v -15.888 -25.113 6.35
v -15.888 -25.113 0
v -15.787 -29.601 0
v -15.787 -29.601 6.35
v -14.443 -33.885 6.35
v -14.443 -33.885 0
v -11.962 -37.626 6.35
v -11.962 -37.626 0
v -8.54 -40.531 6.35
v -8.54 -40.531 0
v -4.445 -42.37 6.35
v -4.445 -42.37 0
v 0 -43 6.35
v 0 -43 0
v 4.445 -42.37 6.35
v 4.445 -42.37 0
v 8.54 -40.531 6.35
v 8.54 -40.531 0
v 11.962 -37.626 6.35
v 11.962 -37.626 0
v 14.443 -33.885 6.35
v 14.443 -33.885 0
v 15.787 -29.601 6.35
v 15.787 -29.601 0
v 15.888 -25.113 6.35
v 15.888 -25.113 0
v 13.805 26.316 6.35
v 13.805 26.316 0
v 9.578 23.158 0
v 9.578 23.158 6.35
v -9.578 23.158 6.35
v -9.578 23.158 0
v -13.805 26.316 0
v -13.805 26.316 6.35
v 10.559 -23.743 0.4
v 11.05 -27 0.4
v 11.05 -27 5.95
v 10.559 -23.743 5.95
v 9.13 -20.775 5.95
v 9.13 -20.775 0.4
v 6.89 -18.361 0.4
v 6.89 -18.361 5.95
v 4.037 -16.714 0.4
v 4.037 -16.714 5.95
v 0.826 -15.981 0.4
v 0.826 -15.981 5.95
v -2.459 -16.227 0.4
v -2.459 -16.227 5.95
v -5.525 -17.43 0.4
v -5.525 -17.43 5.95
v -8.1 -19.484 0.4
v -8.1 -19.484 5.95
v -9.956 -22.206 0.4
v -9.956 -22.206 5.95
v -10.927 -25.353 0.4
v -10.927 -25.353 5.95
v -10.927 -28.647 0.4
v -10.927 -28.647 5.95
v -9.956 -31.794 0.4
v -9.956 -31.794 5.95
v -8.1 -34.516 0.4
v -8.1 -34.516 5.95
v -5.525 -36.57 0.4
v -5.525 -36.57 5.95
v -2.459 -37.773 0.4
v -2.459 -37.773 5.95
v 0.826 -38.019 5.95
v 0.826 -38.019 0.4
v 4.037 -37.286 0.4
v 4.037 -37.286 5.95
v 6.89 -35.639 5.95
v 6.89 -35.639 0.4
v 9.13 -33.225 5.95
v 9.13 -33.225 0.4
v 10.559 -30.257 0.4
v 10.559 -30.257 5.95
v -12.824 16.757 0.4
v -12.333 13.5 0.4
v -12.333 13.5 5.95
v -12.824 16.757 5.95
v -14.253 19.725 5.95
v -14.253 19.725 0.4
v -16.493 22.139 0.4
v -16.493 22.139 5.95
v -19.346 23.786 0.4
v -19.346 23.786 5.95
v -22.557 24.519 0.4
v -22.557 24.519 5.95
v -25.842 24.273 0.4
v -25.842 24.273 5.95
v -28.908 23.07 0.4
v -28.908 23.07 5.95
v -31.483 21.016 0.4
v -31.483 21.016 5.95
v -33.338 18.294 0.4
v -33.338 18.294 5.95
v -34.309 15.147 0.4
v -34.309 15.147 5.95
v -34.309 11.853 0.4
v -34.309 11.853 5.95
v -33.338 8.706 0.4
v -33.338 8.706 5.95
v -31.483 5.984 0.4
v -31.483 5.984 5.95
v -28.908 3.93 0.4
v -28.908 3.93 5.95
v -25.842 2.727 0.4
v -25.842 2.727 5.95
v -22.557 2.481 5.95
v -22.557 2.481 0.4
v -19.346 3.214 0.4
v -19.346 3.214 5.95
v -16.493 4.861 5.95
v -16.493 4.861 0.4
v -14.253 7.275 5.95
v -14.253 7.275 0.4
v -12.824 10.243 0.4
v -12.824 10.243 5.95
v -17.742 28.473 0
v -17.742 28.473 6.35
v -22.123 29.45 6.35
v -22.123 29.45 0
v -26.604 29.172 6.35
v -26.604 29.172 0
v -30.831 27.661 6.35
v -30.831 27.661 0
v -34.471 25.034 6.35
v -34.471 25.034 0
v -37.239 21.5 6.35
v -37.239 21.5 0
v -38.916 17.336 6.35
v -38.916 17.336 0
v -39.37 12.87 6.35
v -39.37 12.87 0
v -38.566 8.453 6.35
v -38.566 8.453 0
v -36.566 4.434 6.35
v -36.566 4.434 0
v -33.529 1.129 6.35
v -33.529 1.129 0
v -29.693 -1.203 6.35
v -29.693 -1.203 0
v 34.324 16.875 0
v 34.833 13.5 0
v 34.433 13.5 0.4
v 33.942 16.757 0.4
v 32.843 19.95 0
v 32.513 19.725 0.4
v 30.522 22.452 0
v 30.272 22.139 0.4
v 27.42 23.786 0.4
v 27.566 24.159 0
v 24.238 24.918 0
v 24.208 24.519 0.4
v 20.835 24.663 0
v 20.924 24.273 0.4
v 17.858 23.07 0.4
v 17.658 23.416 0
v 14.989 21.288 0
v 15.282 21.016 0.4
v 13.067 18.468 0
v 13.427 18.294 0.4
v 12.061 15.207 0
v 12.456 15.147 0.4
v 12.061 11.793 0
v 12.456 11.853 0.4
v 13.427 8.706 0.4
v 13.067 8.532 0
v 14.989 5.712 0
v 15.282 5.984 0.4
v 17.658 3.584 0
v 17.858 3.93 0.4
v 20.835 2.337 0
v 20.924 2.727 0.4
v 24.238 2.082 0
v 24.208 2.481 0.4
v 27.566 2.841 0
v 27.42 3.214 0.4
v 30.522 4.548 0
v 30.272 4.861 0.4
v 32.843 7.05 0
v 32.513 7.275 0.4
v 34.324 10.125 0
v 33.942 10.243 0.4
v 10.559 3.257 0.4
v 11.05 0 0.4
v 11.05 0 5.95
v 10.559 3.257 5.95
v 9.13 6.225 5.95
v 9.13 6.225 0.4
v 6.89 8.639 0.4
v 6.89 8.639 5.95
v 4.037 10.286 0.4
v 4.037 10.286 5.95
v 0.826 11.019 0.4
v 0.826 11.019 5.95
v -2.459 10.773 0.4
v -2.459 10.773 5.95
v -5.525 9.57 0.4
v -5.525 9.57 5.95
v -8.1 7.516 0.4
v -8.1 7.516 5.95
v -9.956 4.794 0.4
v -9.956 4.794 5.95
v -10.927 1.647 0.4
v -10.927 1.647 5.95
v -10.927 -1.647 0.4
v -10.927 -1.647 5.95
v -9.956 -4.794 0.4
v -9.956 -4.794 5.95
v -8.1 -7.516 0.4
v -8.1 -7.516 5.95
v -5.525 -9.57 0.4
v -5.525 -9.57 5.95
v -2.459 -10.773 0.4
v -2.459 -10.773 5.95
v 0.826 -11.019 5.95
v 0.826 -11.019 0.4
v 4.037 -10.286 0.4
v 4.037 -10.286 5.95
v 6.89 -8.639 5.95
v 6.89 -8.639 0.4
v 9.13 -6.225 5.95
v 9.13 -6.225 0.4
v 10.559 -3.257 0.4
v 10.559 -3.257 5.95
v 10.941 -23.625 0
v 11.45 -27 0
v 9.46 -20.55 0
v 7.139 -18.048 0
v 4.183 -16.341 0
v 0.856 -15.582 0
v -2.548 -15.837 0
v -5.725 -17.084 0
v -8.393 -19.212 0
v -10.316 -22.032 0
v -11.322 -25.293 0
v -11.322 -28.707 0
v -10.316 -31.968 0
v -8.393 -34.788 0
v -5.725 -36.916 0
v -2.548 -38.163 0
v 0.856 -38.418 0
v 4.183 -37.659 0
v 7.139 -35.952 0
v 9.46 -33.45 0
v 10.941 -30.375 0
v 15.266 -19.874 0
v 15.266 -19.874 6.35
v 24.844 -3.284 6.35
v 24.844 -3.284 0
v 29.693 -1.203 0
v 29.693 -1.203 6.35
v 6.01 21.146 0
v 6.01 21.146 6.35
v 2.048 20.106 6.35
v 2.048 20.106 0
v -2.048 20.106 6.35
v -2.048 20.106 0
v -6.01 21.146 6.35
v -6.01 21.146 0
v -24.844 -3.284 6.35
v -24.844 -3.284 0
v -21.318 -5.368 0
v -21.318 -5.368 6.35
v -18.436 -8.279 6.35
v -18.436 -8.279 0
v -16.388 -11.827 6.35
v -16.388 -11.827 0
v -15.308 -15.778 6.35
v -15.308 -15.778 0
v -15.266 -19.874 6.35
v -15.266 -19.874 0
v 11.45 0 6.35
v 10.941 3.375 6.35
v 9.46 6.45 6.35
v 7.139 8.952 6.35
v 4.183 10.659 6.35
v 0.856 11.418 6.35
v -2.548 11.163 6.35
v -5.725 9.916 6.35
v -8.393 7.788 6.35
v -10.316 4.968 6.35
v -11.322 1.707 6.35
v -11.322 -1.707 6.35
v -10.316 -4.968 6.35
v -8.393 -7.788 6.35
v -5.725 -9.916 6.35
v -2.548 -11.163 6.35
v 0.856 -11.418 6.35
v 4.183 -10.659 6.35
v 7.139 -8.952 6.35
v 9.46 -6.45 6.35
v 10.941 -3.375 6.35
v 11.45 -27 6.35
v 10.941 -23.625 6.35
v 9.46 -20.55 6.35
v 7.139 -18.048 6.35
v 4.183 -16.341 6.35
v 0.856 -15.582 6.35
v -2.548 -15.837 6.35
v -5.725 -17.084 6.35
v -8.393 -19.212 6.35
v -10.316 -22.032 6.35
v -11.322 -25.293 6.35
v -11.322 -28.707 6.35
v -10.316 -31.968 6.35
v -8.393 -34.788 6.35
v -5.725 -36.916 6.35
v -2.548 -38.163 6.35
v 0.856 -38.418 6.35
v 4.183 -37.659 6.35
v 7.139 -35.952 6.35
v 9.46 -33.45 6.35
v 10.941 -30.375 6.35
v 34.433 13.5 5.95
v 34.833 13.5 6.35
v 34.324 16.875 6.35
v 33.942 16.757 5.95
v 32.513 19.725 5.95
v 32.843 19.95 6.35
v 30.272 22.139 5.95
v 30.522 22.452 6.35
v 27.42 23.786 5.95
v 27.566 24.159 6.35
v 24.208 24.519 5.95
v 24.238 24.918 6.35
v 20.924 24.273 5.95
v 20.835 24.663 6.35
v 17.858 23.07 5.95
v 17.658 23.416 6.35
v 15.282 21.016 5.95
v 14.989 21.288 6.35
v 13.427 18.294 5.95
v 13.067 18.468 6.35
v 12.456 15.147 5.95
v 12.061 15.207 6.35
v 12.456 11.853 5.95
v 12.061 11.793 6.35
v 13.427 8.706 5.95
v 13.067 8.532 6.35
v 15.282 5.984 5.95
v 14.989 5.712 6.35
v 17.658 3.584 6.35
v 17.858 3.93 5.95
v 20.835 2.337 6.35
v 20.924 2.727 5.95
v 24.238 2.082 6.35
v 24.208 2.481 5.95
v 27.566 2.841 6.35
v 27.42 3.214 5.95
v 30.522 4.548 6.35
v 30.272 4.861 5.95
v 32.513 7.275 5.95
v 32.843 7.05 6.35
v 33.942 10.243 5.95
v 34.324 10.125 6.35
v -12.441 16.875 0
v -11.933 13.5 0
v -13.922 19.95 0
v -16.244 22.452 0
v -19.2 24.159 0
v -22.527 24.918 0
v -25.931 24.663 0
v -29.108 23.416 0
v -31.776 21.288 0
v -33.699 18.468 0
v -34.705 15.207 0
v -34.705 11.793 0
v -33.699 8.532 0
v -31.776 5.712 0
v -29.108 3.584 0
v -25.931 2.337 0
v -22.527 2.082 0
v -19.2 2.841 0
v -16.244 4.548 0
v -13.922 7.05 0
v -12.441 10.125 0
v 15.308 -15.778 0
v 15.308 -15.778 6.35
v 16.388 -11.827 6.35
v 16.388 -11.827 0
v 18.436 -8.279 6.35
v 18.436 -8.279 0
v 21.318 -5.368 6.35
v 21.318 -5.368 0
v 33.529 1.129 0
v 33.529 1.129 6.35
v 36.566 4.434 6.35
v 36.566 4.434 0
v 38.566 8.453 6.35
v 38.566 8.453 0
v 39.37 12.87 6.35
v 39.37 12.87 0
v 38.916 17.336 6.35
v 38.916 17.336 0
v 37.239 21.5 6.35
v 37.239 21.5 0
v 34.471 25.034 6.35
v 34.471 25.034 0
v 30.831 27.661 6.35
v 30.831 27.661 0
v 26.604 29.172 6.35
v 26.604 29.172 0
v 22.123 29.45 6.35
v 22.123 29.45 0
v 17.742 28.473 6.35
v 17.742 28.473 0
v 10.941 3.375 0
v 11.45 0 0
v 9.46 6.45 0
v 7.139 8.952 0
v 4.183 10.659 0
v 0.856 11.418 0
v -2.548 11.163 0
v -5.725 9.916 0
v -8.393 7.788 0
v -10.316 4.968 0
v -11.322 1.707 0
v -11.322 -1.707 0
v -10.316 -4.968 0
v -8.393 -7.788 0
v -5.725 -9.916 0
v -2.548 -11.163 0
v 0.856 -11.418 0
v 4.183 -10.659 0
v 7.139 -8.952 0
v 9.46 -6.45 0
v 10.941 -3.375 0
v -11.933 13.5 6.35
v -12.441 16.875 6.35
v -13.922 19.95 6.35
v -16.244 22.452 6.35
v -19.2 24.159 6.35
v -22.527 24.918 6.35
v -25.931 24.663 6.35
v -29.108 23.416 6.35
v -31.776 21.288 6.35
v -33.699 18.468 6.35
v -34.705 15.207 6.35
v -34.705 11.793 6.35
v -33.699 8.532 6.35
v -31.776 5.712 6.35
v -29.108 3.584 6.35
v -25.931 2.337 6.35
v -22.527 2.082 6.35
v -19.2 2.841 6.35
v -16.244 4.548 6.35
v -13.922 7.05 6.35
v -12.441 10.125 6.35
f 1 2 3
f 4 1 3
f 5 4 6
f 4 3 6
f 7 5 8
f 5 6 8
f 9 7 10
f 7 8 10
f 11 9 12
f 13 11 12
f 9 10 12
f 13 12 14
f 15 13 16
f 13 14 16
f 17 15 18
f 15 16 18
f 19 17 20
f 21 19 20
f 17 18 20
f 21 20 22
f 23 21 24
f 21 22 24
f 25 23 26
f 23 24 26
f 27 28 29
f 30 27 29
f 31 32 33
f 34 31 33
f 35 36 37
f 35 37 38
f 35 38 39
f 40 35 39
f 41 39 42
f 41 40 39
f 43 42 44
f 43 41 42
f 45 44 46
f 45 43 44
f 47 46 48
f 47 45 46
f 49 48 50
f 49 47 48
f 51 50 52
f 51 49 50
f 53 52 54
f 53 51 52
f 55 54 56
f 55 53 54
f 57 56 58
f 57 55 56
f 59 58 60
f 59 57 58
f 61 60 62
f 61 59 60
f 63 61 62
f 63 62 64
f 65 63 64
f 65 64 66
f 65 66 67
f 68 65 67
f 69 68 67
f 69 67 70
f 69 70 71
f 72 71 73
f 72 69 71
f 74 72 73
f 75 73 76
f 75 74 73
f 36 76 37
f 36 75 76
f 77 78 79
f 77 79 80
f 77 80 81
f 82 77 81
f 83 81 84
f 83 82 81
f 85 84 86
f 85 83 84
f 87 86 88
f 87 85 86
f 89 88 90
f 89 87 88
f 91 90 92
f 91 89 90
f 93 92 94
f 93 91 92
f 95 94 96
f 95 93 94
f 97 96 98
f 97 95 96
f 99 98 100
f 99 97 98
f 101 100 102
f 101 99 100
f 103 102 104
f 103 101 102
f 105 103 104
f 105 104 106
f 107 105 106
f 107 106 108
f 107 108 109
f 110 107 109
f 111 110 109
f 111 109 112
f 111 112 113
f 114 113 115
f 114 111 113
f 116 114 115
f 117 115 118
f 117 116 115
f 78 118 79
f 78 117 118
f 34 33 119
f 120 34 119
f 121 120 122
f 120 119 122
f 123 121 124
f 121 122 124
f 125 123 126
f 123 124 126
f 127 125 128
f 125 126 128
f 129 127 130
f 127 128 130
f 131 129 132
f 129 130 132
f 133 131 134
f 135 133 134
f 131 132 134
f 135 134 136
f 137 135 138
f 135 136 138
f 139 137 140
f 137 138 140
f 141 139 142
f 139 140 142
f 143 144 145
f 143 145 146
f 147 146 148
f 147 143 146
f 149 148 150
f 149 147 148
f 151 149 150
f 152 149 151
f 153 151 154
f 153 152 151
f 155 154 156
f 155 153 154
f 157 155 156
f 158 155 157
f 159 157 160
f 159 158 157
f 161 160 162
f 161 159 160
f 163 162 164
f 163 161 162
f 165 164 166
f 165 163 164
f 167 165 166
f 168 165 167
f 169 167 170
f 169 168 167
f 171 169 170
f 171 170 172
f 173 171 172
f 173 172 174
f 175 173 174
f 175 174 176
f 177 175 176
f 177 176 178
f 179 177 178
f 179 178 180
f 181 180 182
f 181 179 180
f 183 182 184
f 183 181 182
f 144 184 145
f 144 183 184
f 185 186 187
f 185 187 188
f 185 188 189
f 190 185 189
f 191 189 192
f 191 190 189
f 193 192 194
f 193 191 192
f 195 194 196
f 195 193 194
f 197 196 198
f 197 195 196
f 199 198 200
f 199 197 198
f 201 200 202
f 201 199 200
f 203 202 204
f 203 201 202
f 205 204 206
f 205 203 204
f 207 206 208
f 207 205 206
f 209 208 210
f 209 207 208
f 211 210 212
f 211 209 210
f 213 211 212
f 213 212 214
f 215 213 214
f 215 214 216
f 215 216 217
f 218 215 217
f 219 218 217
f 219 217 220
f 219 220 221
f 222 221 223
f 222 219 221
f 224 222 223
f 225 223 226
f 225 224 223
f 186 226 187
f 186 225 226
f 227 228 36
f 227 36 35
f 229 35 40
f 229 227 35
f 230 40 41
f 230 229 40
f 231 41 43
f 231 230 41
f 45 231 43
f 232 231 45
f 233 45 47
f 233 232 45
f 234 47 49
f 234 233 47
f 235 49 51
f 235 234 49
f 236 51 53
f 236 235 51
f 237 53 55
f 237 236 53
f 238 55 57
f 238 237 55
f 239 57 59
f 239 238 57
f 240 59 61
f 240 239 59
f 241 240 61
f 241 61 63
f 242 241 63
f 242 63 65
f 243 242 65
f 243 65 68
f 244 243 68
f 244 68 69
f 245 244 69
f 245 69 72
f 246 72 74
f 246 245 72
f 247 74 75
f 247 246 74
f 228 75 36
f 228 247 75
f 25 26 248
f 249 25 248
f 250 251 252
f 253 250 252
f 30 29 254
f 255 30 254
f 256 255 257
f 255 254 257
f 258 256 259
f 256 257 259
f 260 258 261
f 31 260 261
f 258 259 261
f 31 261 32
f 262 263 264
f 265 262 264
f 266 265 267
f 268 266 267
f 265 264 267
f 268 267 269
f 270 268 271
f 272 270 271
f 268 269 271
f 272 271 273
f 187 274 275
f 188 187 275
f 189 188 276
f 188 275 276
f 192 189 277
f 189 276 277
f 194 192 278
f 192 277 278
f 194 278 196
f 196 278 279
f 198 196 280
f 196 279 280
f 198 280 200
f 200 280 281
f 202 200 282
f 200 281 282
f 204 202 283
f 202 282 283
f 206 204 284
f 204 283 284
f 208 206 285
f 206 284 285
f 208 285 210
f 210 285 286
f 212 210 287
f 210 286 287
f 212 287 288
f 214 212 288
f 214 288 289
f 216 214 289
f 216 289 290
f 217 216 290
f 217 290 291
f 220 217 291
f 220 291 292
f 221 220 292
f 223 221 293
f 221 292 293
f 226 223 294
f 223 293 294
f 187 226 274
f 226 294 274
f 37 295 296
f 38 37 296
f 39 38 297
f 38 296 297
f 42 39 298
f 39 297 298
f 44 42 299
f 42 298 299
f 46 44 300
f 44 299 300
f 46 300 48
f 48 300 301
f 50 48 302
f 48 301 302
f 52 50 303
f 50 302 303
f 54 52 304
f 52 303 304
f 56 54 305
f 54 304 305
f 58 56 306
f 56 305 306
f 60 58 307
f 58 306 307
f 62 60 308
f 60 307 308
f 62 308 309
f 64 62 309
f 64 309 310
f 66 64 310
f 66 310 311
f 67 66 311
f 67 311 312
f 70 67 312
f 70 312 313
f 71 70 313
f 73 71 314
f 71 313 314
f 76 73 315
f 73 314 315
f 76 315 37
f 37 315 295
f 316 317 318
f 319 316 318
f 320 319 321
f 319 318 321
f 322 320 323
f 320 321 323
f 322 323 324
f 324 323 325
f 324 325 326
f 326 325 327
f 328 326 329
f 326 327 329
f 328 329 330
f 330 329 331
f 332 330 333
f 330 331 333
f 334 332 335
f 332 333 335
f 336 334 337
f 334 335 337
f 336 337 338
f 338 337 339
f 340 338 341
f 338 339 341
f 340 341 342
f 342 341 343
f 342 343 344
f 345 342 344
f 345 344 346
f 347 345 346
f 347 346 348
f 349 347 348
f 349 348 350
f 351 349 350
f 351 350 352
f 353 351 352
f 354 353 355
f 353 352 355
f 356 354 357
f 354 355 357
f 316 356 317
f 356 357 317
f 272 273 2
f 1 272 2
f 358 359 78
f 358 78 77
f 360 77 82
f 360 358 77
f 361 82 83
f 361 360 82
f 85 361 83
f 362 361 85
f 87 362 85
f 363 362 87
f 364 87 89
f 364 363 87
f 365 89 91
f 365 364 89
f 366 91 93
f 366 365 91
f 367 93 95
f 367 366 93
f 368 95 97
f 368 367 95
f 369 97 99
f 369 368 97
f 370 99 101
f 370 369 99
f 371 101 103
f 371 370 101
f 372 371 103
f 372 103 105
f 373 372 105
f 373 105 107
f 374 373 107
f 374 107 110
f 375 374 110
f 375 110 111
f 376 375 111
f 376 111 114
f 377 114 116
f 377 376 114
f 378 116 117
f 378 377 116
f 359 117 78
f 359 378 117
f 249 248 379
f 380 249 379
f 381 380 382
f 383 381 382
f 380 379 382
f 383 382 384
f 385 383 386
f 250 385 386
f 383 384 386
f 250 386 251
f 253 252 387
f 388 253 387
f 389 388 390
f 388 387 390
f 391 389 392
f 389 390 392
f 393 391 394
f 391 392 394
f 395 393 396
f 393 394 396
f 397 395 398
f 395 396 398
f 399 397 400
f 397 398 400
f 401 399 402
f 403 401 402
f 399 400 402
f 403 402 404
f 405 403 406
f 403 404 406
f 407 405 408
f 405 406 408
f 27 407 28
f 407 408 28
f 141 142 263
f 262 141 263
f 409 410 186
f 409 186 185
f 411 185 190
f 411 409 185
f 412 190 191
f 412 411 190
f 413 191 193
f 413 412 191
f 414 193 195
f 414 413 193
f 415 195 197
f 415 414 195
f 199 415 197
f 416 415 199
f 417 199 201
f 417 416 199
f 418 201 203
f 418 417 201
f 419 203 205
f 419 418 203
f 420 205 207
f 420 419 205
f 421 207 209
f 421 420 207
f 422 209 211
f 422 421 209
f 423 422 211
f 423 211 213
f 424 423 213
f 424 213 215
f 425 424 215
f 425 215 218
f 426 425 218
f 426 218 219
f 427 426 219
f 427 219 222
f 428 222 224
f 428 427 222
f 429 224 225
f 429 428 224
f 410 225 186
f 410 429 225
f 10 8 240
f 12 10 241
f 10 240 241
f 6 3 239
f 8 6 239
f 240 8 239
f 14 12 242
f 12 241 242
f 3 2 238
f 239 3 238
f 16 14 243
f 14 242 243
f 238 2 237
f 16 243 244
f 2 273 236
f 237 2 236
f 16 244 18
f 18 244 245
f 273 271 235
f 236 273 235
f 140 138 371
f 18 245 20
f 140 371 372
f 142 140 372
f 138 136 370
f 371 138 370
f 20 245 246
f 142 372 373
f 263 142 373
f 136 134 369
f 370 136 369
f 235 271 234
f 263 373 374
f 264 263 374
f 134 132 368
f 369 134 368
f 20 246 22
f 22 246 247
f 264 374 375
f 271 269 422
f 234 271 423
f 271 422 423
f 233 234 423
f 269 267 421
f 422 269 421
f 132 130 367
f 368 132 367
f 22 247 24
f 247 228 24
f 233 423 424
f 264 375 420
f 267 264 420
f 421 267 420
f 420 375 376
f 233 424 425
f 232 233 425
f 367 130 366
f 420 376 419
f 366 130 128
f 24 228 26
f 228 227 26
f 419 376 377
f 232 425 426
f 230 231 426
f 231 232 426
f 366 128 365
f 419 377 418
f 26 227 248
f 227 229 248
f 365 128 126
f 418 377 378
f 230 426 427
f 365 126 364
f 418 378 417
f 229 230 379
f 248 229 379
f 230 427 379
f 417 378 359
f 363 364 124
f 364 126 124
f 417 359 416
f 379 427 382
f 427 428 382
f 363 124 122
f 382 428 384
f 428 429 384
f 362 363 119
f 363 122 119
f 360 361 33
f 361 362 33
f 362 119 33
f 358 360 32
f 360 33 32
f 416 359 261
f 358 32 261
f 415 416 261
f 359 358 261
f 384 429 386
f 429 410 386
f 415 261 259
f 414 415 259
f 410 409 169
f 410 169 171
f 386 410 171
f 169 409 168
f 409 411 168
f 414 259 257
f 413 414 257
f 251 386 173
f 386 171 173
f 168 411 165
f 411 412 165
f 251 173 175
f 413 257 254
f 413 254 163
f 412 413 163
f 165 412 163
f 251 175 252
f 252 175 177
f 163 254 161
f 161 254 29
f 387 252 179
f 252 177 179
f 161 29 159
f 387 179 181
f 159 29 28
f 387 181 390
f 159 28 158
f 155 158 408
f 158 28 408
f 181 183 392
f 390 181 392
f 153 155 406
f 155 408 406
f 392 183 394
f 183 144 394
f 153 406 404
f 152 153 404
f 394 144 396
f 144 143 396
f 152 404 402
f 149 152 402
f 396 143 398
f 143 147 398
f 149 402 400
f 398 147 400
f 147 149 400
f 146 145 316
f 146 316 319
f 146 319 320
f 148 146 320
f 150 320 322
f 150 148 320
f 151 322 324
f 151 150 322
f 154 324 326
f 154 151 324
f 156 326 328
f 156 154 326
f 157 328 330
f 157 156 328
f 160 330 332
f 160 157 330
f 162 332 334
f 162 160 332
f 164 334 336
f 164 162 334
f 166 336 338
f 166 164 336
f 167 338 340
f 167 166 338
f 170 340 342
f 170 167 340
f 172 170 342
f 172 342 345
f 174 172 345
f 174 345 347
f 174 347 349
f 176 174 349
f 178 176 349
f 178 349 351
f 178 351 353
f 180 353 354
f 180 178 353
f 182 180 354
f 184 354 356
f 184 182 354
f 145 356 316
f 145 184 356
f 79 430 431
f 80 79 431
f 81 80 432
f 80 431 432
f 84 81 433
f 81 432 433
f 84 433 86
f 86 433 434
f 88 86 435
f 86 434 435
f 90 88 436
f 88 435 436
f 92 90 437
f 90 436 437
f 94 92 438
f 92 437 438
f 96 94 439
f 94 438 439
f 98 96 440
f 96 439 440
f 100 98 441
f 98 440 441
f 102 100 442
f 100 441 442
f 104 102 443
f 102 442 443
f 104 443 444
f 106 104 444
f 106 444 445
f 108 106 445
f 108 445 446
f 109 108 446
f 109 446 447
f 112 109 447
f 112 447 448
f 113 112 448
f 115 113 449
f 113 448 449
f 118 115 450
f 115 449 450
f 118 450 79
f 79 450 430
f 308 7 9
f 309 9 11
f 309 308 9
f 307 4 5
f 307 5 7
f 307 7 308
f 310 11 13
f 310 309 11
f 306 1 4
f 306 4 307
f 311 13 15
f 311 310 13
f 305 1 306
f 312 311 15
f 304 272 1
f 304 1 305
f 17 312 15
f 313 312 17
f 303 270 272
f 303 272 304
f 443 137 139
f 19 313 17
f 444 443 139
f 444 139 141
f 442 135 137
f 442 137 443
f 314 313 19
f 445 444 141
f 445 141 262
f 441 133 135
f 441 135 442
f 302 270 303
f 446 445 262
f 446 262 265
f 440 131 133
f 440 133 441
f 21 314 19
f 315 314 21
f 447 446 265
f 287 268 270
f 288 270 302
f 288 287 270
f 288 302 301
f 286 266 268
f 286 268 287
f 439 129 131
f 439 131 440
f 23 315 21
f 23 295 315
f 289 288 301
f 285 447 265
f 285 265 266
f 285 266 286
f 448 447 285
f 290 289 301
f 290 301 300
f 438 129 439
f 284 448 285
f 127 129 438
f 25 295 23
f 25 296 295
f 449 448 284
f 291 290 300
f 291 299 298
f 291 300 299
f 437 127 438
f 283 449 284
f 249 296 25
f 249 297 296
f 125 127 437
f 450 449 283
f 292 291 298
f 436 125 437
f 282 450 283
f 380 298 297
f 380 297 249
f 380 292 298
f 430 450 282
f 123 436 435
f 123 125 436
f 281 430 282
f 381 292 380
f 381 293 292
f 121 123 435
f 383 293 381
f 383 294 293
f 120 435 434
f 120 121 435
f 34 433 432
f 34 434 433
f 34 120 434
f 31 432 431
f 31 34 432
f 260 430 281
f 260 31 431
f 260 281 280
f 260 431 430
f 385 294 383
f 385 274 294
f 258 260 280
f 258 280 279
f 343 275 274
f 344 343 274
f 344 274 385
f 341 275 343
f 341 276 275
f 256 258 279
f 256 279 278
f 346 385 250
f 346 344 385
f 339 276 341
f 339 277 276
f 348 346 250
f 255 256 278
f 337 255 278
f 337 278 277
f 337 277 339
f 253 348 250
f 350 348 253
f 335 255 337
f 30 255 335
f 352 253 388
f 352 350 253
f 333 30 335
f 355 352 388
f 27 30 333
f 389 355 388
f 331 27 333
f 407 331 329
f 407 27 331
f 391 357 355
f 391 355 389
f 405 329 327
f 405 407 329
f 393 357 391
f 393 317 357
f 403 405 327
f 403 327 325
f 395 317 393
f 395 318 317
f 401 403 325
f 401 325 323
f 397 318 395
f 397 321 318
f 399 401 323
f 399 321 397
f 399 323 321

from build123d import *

# Parameters (mm, degrees)
F0_R     = 11.05
F1_DEPTH = 6.35
F2_SIZE  = 0.4


with BuildPart() as f1:
    # F0 (on Top) → F1 (new body)
    with BuildSketch(Plane.XY):
        with BuildLine():
            Line((-9.577975, 23.157779), (-13.804711, 26.316489))
            ThreePointArc((-13.804711, 26.316489), (-37.239092, 21.5), (-29.693104, -1.203014))
            Line((-29.693104, -1.203014), (-24.844213, -3.28412))
            ThreePointArc((-24.844213, -3.28412), (-17.298224, -9.987134), (-15.266238, -19.873659))
            Line((-15.266238, -19.873659), (-15.888393, -25.113475))
            ThreePointArc((-15.888393, -25.113475), (0, -43), (15.888393, -25.113475))
            Line((15.888393, -25.113475), (15.266238, -19.873659))
            ThreePointArc((15.266238, -19.873659), (17.298224, -9.987134), (24.844213, -3.28412))
            Line((24.844213, -3.28412), (29.693104, -1.203014))
            ThreePointArc((29.693104, -1.203014), (37.239092, 21.5), (13.804711, 26.316489))
            Line((13.804711, 26.316489), (9.577975, 23.157779))
            ThreePointArc((9.577975, 23.157779), (0, 19.974269), (-9.577975, 23.157779))
        make_face()
        with Locations((0, -27)):
            Circle(F0_R, mode=Mode.SUBTRACT)
        with Locations((-23.382686, 13.5)):
            Circle(F0_R, mode=Mode.SUBTRACT)
        Circle(F0_R, mode=Mode.SUBTRACT)
        with Locations((23.382686, 13.5)):
            Circle(F0_R, mode=Mode.SUBTRACT)
    extrude(amount=F1_DEPTH)

    # F2
    f2_edges = [f1.edges().sort_by_distance(p)[0] for p in [
        (-11.05, 0, 6.35),
        (-11.05, 0, 0),
        (-11.05, -27, 6.35),
        (-11.05, -27, 0),
        (-34.432686, 13.5, 6.35),
        (-34.432686, 13.5, 0),
        (12.332686, 13.5, 6.35),
        (12.332686, 13.5, 0),
    ]]
    chamfer(f2_edges, length=F2_SIZE)


solid = f1.part
